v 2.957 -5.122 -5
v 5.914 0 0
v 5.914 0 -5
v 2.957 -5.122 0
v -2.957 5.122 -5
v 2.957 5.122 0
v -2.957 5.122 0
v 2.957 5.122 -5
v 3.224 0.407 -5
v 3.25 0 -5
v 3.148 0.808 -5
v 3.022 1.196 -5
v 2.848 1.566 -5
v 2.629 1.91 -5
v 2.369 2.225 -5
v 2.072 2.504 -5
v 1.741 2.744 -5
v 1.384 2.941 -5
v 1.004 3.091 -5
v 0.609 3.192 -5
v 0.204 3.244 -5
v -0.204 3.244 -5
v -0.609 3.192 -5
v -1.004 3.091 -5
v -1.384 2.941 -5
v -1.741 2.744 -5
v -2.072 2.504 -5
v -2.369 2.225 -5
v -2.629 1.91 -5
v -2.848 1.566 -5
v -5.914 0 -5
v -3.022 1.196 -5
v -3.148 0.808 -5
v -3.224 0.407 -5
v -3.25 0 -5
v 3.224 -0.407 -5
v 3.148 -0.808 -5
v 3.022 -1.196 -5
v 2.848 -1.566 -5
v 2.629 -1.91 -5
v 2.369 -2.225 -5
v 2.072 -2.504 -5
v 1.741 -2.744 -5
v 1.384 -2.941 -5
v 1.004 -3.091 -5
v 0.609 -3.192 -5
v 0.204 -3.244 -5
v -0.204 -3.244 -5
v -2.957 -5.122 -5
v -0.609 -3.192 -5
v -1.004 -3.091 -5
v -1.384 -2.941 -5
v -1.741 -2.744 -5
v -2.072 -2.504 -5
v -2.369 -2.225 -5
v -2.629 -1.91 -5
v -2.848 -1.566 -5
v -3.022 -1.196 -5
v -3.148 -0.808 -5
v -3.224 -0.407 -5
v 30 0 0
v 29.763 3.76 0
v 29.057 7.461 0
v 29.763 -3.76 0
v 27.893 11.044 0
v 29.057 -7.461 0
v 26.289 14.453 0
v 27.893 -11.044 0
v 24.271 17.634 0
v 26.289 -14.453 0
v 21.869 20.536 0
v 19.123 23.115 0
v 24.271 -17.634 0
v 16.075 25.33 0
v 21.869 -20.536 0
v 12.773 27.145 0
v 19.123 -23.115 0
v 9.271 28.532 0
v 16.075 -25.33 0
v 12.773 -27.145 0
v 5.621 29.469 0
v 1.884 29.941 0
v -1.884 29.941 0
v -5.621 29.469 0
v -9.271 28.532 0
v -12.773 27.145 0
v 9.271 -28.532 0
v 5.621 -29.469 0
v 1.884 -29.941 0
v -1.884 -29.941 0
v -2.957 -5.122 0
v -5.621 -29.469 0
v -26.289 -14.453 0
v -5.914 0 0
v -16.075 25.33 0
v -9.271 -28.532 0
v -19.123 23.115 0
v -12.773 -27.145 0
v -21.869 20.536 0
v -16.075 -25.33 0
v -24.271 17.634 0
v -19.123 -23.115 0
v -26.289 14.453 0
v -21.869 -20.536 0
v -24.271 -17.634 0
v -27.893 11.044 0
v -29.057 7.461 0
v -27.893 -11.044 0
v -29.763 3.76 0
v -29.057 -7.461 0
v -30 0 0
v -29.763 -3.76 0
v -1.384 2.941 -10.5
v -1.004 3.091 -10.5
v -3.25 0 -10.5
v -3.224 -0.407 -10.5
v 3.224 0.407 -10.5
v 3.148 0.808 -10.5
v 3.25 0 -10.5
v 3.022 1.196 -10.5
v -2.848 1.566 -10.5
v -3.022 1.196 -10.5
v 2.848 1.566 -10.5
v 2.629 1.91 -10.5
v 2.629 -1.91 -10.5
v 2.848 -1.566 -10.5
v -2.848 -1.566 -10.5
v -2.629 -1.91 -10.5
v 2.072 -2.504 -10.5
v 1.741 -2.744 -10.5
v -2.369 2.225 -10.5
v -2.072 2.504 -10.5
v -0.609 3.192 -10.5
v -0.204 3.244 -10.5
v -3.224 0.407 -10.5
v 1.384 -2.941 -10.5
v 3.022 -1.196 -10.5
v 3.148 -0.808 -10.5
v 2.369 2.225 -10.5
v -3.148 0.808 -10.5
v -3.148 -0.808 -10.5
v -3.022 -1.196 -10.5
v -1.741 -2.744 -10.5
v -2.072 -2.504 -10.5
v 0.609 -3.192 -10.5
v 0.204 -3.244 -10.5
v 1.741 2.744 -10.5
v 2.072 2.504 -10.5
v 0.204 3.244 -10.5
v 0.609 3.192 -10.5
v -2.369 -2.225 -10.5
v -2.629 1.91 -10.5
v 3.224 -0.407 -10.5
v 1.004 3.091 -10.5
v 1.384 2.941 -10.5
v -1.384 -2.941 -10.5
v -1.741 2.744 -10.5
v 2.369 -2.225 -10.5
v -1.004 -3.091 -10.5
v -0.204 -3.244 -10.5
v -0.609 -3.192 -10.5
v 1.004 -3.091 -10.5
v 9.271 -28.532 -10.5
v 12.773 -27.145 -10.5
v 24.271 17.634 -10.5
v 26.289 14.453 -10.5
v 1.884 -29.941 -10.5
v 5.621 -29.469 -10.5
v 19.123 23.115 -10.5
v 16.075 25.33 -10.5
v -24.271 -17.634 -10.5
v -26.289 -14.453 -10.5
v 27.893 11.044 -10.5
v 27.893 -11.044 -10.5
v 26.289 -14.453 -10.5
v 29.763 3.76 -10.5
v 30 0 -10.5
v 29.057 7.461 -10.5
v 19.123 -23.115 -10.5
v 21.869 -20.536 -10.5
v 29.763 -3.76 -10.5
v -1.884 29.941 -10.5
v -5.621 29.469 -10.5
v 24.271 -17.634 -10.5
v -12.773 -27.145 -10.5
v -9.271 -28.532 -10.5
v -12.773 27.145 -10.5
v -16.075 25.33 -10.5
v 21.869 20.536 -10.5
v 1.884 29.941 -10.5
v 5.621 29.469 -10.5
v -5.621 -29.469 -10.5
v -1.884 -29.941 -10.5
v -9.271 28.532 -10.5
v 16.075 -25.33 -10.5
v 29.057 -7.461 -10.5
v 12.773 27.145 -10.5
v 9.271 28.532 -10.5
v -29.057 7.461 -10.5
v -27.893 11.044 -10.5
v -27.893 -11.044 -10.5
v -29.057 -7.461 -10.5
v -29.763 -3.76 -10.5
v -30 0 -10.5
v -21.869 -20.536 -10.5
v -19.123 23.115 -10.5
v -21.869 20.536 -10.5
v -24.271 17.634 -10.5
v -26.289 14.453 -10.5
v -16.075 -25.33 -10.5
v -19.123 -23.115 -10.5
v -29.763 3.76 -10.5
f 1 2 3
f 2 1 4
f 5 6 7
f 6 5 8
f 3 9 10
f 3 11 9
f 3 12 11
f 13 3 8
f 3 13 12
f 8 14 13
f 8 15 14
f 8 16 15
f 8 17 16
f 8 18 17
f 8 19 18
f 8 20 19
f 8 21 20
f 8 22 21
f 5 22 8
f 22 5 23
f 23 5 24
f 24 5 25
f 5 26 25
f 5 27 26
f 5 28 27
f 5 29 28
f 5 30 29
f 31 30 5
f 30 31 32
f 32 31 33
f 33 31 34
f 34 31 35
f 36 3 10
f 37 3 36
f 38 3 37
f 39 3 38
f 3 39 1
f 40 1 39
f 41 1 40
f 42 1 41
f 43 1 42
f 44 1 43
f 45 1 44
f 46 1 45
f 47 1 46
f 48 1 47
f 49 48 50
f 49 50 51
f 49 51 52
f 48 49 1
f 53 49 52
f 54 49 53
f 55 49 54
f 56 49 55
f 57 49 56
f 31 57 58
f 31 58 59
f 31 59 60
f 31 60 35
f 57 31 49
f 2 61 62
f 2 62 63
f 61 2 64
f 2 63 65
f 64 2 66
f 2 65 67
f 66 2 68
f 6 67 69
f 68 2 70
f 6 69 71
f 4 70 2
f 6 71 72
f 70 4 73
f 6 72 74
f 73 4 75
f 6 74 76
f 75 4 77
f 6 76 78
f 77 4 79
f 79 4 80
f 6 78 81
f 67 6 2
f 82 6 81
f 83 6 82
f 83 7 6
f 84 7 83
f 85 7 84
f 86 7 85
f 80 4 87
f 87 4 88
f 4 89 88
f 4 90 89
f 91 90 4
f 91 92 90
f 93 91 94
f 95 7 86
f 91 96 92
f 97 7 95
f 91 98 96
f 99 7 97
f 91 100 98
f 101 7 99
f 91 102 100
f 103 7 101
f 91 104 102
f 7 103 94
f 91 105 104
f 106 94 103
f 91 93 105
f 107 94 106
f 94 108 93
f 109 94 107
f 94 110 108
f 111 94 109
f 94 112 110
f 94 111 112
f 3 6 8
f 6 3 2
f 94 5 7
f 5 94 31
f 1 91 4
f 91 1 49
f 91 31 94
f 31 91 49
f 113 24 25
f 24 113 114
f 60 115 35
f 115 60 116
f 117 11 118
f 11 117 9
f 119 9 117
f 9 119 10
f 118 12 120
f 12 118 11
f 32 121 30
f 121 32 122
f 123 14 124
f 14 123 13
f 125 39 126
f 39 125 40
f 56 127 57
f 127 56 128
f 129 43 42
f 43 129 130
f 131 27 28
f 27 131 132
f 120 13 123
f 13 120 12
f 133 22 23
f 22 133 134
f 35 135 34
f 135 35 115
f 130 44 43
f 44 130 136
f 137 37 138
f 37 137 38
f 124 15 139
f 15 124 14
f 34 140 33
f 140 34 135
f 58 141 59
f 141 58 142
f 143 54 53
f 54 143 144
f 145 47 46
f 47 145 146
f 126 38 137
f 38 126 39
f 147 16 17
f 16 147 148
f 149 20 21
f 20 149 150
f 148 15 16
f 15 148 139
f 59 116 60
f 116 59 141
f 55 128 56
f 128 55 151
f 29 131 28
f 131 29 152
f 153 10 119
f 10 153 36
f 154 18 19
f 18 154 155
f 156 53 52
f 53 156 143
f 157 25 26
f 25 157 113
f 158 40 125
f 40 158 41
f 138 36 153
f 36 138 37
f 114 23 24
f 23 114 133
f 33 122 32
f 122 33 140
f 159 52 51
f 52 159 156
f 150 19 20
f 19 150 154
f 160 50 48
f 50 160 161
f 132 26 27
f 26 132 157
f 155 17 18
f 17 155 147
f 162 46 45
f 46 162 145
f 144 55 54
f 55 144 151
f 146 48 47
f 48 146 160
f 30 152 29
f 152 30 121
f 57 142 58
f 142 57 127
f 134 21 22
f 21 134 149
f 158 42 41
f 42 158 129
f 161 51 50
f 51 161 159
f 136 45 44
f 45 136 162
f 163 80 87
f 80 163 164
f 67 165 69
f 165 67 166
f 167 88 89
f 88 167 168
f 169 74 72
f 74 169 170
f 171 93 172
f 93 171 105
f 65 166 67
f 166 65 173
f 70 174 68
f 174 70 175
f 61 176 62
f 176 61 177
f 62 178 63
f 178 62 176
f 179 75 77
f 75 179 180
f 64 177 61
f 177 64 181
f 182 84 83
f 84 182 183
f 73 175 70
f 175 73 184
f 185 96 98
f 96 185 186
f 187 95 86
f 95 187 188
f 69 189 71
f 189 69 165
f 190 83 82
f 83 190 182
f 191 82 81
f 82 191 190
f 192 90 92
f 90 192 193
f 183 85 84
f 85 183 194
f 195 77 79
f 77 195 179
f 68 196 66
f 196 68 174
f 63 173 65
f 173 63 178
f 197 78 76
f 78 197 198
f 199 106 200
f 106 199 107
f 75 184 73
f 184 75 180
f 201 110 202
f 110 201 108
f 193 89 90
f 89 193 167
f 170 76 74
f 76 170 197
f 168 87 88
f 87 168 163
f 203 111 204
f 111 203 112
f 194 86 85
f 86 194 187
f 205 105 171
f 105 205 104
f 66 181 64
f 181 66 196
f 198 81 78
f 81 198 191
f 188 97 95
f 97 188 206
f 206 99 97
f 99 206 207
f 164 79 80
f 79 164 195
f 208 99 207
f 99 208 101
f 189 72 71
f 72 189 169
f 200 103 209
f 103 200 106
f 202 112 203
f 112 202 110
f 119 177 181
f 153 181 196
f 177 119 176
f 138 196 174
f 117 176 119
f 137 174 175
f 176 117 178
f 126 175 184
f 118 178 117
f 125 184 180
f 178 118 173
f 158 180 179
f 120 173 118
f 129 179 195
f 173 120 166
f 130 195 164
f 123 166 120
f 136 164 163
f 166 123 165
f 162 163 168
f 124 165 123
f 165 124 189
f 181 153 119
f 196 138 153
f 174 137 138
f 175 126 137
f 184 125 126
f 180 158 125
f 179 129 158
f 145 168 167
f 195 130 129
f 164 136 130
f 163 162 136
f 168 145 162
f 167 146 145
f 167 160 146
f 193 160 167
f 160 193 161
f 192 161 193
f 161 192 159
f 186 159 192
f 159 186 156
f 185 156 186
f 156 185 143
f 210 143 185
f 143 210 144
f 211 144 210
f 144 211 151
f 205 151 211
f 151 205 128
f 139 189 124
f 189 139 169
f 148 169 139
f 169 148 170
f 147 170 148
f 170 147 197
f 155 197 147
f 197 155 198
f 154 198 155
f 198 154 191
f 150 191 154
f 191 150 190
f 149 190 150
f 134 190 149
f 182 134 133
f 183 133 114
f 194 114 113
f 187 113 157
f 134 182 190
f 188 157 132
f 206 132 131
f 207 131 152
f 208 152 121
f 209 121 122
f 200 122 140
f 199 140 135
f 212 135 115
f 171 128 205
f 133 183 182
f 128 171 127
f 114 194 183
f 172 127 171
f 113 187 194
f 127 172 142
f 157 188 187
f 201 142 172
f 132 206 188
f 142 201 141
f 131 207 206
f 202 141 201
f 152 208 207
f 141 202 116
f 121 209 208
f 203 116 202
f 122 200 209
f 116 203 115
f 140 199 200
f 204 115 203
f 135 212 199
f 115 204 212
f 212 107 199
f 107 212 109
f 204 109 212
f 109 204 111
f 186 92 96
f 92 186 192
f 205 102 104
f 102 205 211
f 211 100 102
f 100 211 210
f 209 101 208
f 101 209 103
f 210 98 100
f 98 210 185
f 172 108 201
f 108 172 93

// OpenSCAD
$fn = 50;

difference() {
	union() {
		translate(v = [0, 0, -10.5]) {
			cylinder(h = 10.5, r = 30.0);
		}
	}
	union() {
		translate(v = [0, 0, 0]) {
			rotate(a = [0, 0, 0]) {
				difference() {
					union() {
						translate(v = [0, 0, -5]) {
							linear_extrude(height = 5) {
								polygon(points = [[5.914249999999999, 0.0], [2.957125, 5.1218907443321156], [-2.9571249999999982, 5.1218907443321156], [-5.914249999999999, 7.242867331857232e-16], [-2.9571250000000022, -5.121890744332115], [2.9571249999999956, -5.121890744332118]]);
							}
						}
					}
					union();
				}
			}
		}
		#translate(v = [0, 0, -100.0]) {
			cylinder(h = 200, r = 3.25);
		}
	}
}
